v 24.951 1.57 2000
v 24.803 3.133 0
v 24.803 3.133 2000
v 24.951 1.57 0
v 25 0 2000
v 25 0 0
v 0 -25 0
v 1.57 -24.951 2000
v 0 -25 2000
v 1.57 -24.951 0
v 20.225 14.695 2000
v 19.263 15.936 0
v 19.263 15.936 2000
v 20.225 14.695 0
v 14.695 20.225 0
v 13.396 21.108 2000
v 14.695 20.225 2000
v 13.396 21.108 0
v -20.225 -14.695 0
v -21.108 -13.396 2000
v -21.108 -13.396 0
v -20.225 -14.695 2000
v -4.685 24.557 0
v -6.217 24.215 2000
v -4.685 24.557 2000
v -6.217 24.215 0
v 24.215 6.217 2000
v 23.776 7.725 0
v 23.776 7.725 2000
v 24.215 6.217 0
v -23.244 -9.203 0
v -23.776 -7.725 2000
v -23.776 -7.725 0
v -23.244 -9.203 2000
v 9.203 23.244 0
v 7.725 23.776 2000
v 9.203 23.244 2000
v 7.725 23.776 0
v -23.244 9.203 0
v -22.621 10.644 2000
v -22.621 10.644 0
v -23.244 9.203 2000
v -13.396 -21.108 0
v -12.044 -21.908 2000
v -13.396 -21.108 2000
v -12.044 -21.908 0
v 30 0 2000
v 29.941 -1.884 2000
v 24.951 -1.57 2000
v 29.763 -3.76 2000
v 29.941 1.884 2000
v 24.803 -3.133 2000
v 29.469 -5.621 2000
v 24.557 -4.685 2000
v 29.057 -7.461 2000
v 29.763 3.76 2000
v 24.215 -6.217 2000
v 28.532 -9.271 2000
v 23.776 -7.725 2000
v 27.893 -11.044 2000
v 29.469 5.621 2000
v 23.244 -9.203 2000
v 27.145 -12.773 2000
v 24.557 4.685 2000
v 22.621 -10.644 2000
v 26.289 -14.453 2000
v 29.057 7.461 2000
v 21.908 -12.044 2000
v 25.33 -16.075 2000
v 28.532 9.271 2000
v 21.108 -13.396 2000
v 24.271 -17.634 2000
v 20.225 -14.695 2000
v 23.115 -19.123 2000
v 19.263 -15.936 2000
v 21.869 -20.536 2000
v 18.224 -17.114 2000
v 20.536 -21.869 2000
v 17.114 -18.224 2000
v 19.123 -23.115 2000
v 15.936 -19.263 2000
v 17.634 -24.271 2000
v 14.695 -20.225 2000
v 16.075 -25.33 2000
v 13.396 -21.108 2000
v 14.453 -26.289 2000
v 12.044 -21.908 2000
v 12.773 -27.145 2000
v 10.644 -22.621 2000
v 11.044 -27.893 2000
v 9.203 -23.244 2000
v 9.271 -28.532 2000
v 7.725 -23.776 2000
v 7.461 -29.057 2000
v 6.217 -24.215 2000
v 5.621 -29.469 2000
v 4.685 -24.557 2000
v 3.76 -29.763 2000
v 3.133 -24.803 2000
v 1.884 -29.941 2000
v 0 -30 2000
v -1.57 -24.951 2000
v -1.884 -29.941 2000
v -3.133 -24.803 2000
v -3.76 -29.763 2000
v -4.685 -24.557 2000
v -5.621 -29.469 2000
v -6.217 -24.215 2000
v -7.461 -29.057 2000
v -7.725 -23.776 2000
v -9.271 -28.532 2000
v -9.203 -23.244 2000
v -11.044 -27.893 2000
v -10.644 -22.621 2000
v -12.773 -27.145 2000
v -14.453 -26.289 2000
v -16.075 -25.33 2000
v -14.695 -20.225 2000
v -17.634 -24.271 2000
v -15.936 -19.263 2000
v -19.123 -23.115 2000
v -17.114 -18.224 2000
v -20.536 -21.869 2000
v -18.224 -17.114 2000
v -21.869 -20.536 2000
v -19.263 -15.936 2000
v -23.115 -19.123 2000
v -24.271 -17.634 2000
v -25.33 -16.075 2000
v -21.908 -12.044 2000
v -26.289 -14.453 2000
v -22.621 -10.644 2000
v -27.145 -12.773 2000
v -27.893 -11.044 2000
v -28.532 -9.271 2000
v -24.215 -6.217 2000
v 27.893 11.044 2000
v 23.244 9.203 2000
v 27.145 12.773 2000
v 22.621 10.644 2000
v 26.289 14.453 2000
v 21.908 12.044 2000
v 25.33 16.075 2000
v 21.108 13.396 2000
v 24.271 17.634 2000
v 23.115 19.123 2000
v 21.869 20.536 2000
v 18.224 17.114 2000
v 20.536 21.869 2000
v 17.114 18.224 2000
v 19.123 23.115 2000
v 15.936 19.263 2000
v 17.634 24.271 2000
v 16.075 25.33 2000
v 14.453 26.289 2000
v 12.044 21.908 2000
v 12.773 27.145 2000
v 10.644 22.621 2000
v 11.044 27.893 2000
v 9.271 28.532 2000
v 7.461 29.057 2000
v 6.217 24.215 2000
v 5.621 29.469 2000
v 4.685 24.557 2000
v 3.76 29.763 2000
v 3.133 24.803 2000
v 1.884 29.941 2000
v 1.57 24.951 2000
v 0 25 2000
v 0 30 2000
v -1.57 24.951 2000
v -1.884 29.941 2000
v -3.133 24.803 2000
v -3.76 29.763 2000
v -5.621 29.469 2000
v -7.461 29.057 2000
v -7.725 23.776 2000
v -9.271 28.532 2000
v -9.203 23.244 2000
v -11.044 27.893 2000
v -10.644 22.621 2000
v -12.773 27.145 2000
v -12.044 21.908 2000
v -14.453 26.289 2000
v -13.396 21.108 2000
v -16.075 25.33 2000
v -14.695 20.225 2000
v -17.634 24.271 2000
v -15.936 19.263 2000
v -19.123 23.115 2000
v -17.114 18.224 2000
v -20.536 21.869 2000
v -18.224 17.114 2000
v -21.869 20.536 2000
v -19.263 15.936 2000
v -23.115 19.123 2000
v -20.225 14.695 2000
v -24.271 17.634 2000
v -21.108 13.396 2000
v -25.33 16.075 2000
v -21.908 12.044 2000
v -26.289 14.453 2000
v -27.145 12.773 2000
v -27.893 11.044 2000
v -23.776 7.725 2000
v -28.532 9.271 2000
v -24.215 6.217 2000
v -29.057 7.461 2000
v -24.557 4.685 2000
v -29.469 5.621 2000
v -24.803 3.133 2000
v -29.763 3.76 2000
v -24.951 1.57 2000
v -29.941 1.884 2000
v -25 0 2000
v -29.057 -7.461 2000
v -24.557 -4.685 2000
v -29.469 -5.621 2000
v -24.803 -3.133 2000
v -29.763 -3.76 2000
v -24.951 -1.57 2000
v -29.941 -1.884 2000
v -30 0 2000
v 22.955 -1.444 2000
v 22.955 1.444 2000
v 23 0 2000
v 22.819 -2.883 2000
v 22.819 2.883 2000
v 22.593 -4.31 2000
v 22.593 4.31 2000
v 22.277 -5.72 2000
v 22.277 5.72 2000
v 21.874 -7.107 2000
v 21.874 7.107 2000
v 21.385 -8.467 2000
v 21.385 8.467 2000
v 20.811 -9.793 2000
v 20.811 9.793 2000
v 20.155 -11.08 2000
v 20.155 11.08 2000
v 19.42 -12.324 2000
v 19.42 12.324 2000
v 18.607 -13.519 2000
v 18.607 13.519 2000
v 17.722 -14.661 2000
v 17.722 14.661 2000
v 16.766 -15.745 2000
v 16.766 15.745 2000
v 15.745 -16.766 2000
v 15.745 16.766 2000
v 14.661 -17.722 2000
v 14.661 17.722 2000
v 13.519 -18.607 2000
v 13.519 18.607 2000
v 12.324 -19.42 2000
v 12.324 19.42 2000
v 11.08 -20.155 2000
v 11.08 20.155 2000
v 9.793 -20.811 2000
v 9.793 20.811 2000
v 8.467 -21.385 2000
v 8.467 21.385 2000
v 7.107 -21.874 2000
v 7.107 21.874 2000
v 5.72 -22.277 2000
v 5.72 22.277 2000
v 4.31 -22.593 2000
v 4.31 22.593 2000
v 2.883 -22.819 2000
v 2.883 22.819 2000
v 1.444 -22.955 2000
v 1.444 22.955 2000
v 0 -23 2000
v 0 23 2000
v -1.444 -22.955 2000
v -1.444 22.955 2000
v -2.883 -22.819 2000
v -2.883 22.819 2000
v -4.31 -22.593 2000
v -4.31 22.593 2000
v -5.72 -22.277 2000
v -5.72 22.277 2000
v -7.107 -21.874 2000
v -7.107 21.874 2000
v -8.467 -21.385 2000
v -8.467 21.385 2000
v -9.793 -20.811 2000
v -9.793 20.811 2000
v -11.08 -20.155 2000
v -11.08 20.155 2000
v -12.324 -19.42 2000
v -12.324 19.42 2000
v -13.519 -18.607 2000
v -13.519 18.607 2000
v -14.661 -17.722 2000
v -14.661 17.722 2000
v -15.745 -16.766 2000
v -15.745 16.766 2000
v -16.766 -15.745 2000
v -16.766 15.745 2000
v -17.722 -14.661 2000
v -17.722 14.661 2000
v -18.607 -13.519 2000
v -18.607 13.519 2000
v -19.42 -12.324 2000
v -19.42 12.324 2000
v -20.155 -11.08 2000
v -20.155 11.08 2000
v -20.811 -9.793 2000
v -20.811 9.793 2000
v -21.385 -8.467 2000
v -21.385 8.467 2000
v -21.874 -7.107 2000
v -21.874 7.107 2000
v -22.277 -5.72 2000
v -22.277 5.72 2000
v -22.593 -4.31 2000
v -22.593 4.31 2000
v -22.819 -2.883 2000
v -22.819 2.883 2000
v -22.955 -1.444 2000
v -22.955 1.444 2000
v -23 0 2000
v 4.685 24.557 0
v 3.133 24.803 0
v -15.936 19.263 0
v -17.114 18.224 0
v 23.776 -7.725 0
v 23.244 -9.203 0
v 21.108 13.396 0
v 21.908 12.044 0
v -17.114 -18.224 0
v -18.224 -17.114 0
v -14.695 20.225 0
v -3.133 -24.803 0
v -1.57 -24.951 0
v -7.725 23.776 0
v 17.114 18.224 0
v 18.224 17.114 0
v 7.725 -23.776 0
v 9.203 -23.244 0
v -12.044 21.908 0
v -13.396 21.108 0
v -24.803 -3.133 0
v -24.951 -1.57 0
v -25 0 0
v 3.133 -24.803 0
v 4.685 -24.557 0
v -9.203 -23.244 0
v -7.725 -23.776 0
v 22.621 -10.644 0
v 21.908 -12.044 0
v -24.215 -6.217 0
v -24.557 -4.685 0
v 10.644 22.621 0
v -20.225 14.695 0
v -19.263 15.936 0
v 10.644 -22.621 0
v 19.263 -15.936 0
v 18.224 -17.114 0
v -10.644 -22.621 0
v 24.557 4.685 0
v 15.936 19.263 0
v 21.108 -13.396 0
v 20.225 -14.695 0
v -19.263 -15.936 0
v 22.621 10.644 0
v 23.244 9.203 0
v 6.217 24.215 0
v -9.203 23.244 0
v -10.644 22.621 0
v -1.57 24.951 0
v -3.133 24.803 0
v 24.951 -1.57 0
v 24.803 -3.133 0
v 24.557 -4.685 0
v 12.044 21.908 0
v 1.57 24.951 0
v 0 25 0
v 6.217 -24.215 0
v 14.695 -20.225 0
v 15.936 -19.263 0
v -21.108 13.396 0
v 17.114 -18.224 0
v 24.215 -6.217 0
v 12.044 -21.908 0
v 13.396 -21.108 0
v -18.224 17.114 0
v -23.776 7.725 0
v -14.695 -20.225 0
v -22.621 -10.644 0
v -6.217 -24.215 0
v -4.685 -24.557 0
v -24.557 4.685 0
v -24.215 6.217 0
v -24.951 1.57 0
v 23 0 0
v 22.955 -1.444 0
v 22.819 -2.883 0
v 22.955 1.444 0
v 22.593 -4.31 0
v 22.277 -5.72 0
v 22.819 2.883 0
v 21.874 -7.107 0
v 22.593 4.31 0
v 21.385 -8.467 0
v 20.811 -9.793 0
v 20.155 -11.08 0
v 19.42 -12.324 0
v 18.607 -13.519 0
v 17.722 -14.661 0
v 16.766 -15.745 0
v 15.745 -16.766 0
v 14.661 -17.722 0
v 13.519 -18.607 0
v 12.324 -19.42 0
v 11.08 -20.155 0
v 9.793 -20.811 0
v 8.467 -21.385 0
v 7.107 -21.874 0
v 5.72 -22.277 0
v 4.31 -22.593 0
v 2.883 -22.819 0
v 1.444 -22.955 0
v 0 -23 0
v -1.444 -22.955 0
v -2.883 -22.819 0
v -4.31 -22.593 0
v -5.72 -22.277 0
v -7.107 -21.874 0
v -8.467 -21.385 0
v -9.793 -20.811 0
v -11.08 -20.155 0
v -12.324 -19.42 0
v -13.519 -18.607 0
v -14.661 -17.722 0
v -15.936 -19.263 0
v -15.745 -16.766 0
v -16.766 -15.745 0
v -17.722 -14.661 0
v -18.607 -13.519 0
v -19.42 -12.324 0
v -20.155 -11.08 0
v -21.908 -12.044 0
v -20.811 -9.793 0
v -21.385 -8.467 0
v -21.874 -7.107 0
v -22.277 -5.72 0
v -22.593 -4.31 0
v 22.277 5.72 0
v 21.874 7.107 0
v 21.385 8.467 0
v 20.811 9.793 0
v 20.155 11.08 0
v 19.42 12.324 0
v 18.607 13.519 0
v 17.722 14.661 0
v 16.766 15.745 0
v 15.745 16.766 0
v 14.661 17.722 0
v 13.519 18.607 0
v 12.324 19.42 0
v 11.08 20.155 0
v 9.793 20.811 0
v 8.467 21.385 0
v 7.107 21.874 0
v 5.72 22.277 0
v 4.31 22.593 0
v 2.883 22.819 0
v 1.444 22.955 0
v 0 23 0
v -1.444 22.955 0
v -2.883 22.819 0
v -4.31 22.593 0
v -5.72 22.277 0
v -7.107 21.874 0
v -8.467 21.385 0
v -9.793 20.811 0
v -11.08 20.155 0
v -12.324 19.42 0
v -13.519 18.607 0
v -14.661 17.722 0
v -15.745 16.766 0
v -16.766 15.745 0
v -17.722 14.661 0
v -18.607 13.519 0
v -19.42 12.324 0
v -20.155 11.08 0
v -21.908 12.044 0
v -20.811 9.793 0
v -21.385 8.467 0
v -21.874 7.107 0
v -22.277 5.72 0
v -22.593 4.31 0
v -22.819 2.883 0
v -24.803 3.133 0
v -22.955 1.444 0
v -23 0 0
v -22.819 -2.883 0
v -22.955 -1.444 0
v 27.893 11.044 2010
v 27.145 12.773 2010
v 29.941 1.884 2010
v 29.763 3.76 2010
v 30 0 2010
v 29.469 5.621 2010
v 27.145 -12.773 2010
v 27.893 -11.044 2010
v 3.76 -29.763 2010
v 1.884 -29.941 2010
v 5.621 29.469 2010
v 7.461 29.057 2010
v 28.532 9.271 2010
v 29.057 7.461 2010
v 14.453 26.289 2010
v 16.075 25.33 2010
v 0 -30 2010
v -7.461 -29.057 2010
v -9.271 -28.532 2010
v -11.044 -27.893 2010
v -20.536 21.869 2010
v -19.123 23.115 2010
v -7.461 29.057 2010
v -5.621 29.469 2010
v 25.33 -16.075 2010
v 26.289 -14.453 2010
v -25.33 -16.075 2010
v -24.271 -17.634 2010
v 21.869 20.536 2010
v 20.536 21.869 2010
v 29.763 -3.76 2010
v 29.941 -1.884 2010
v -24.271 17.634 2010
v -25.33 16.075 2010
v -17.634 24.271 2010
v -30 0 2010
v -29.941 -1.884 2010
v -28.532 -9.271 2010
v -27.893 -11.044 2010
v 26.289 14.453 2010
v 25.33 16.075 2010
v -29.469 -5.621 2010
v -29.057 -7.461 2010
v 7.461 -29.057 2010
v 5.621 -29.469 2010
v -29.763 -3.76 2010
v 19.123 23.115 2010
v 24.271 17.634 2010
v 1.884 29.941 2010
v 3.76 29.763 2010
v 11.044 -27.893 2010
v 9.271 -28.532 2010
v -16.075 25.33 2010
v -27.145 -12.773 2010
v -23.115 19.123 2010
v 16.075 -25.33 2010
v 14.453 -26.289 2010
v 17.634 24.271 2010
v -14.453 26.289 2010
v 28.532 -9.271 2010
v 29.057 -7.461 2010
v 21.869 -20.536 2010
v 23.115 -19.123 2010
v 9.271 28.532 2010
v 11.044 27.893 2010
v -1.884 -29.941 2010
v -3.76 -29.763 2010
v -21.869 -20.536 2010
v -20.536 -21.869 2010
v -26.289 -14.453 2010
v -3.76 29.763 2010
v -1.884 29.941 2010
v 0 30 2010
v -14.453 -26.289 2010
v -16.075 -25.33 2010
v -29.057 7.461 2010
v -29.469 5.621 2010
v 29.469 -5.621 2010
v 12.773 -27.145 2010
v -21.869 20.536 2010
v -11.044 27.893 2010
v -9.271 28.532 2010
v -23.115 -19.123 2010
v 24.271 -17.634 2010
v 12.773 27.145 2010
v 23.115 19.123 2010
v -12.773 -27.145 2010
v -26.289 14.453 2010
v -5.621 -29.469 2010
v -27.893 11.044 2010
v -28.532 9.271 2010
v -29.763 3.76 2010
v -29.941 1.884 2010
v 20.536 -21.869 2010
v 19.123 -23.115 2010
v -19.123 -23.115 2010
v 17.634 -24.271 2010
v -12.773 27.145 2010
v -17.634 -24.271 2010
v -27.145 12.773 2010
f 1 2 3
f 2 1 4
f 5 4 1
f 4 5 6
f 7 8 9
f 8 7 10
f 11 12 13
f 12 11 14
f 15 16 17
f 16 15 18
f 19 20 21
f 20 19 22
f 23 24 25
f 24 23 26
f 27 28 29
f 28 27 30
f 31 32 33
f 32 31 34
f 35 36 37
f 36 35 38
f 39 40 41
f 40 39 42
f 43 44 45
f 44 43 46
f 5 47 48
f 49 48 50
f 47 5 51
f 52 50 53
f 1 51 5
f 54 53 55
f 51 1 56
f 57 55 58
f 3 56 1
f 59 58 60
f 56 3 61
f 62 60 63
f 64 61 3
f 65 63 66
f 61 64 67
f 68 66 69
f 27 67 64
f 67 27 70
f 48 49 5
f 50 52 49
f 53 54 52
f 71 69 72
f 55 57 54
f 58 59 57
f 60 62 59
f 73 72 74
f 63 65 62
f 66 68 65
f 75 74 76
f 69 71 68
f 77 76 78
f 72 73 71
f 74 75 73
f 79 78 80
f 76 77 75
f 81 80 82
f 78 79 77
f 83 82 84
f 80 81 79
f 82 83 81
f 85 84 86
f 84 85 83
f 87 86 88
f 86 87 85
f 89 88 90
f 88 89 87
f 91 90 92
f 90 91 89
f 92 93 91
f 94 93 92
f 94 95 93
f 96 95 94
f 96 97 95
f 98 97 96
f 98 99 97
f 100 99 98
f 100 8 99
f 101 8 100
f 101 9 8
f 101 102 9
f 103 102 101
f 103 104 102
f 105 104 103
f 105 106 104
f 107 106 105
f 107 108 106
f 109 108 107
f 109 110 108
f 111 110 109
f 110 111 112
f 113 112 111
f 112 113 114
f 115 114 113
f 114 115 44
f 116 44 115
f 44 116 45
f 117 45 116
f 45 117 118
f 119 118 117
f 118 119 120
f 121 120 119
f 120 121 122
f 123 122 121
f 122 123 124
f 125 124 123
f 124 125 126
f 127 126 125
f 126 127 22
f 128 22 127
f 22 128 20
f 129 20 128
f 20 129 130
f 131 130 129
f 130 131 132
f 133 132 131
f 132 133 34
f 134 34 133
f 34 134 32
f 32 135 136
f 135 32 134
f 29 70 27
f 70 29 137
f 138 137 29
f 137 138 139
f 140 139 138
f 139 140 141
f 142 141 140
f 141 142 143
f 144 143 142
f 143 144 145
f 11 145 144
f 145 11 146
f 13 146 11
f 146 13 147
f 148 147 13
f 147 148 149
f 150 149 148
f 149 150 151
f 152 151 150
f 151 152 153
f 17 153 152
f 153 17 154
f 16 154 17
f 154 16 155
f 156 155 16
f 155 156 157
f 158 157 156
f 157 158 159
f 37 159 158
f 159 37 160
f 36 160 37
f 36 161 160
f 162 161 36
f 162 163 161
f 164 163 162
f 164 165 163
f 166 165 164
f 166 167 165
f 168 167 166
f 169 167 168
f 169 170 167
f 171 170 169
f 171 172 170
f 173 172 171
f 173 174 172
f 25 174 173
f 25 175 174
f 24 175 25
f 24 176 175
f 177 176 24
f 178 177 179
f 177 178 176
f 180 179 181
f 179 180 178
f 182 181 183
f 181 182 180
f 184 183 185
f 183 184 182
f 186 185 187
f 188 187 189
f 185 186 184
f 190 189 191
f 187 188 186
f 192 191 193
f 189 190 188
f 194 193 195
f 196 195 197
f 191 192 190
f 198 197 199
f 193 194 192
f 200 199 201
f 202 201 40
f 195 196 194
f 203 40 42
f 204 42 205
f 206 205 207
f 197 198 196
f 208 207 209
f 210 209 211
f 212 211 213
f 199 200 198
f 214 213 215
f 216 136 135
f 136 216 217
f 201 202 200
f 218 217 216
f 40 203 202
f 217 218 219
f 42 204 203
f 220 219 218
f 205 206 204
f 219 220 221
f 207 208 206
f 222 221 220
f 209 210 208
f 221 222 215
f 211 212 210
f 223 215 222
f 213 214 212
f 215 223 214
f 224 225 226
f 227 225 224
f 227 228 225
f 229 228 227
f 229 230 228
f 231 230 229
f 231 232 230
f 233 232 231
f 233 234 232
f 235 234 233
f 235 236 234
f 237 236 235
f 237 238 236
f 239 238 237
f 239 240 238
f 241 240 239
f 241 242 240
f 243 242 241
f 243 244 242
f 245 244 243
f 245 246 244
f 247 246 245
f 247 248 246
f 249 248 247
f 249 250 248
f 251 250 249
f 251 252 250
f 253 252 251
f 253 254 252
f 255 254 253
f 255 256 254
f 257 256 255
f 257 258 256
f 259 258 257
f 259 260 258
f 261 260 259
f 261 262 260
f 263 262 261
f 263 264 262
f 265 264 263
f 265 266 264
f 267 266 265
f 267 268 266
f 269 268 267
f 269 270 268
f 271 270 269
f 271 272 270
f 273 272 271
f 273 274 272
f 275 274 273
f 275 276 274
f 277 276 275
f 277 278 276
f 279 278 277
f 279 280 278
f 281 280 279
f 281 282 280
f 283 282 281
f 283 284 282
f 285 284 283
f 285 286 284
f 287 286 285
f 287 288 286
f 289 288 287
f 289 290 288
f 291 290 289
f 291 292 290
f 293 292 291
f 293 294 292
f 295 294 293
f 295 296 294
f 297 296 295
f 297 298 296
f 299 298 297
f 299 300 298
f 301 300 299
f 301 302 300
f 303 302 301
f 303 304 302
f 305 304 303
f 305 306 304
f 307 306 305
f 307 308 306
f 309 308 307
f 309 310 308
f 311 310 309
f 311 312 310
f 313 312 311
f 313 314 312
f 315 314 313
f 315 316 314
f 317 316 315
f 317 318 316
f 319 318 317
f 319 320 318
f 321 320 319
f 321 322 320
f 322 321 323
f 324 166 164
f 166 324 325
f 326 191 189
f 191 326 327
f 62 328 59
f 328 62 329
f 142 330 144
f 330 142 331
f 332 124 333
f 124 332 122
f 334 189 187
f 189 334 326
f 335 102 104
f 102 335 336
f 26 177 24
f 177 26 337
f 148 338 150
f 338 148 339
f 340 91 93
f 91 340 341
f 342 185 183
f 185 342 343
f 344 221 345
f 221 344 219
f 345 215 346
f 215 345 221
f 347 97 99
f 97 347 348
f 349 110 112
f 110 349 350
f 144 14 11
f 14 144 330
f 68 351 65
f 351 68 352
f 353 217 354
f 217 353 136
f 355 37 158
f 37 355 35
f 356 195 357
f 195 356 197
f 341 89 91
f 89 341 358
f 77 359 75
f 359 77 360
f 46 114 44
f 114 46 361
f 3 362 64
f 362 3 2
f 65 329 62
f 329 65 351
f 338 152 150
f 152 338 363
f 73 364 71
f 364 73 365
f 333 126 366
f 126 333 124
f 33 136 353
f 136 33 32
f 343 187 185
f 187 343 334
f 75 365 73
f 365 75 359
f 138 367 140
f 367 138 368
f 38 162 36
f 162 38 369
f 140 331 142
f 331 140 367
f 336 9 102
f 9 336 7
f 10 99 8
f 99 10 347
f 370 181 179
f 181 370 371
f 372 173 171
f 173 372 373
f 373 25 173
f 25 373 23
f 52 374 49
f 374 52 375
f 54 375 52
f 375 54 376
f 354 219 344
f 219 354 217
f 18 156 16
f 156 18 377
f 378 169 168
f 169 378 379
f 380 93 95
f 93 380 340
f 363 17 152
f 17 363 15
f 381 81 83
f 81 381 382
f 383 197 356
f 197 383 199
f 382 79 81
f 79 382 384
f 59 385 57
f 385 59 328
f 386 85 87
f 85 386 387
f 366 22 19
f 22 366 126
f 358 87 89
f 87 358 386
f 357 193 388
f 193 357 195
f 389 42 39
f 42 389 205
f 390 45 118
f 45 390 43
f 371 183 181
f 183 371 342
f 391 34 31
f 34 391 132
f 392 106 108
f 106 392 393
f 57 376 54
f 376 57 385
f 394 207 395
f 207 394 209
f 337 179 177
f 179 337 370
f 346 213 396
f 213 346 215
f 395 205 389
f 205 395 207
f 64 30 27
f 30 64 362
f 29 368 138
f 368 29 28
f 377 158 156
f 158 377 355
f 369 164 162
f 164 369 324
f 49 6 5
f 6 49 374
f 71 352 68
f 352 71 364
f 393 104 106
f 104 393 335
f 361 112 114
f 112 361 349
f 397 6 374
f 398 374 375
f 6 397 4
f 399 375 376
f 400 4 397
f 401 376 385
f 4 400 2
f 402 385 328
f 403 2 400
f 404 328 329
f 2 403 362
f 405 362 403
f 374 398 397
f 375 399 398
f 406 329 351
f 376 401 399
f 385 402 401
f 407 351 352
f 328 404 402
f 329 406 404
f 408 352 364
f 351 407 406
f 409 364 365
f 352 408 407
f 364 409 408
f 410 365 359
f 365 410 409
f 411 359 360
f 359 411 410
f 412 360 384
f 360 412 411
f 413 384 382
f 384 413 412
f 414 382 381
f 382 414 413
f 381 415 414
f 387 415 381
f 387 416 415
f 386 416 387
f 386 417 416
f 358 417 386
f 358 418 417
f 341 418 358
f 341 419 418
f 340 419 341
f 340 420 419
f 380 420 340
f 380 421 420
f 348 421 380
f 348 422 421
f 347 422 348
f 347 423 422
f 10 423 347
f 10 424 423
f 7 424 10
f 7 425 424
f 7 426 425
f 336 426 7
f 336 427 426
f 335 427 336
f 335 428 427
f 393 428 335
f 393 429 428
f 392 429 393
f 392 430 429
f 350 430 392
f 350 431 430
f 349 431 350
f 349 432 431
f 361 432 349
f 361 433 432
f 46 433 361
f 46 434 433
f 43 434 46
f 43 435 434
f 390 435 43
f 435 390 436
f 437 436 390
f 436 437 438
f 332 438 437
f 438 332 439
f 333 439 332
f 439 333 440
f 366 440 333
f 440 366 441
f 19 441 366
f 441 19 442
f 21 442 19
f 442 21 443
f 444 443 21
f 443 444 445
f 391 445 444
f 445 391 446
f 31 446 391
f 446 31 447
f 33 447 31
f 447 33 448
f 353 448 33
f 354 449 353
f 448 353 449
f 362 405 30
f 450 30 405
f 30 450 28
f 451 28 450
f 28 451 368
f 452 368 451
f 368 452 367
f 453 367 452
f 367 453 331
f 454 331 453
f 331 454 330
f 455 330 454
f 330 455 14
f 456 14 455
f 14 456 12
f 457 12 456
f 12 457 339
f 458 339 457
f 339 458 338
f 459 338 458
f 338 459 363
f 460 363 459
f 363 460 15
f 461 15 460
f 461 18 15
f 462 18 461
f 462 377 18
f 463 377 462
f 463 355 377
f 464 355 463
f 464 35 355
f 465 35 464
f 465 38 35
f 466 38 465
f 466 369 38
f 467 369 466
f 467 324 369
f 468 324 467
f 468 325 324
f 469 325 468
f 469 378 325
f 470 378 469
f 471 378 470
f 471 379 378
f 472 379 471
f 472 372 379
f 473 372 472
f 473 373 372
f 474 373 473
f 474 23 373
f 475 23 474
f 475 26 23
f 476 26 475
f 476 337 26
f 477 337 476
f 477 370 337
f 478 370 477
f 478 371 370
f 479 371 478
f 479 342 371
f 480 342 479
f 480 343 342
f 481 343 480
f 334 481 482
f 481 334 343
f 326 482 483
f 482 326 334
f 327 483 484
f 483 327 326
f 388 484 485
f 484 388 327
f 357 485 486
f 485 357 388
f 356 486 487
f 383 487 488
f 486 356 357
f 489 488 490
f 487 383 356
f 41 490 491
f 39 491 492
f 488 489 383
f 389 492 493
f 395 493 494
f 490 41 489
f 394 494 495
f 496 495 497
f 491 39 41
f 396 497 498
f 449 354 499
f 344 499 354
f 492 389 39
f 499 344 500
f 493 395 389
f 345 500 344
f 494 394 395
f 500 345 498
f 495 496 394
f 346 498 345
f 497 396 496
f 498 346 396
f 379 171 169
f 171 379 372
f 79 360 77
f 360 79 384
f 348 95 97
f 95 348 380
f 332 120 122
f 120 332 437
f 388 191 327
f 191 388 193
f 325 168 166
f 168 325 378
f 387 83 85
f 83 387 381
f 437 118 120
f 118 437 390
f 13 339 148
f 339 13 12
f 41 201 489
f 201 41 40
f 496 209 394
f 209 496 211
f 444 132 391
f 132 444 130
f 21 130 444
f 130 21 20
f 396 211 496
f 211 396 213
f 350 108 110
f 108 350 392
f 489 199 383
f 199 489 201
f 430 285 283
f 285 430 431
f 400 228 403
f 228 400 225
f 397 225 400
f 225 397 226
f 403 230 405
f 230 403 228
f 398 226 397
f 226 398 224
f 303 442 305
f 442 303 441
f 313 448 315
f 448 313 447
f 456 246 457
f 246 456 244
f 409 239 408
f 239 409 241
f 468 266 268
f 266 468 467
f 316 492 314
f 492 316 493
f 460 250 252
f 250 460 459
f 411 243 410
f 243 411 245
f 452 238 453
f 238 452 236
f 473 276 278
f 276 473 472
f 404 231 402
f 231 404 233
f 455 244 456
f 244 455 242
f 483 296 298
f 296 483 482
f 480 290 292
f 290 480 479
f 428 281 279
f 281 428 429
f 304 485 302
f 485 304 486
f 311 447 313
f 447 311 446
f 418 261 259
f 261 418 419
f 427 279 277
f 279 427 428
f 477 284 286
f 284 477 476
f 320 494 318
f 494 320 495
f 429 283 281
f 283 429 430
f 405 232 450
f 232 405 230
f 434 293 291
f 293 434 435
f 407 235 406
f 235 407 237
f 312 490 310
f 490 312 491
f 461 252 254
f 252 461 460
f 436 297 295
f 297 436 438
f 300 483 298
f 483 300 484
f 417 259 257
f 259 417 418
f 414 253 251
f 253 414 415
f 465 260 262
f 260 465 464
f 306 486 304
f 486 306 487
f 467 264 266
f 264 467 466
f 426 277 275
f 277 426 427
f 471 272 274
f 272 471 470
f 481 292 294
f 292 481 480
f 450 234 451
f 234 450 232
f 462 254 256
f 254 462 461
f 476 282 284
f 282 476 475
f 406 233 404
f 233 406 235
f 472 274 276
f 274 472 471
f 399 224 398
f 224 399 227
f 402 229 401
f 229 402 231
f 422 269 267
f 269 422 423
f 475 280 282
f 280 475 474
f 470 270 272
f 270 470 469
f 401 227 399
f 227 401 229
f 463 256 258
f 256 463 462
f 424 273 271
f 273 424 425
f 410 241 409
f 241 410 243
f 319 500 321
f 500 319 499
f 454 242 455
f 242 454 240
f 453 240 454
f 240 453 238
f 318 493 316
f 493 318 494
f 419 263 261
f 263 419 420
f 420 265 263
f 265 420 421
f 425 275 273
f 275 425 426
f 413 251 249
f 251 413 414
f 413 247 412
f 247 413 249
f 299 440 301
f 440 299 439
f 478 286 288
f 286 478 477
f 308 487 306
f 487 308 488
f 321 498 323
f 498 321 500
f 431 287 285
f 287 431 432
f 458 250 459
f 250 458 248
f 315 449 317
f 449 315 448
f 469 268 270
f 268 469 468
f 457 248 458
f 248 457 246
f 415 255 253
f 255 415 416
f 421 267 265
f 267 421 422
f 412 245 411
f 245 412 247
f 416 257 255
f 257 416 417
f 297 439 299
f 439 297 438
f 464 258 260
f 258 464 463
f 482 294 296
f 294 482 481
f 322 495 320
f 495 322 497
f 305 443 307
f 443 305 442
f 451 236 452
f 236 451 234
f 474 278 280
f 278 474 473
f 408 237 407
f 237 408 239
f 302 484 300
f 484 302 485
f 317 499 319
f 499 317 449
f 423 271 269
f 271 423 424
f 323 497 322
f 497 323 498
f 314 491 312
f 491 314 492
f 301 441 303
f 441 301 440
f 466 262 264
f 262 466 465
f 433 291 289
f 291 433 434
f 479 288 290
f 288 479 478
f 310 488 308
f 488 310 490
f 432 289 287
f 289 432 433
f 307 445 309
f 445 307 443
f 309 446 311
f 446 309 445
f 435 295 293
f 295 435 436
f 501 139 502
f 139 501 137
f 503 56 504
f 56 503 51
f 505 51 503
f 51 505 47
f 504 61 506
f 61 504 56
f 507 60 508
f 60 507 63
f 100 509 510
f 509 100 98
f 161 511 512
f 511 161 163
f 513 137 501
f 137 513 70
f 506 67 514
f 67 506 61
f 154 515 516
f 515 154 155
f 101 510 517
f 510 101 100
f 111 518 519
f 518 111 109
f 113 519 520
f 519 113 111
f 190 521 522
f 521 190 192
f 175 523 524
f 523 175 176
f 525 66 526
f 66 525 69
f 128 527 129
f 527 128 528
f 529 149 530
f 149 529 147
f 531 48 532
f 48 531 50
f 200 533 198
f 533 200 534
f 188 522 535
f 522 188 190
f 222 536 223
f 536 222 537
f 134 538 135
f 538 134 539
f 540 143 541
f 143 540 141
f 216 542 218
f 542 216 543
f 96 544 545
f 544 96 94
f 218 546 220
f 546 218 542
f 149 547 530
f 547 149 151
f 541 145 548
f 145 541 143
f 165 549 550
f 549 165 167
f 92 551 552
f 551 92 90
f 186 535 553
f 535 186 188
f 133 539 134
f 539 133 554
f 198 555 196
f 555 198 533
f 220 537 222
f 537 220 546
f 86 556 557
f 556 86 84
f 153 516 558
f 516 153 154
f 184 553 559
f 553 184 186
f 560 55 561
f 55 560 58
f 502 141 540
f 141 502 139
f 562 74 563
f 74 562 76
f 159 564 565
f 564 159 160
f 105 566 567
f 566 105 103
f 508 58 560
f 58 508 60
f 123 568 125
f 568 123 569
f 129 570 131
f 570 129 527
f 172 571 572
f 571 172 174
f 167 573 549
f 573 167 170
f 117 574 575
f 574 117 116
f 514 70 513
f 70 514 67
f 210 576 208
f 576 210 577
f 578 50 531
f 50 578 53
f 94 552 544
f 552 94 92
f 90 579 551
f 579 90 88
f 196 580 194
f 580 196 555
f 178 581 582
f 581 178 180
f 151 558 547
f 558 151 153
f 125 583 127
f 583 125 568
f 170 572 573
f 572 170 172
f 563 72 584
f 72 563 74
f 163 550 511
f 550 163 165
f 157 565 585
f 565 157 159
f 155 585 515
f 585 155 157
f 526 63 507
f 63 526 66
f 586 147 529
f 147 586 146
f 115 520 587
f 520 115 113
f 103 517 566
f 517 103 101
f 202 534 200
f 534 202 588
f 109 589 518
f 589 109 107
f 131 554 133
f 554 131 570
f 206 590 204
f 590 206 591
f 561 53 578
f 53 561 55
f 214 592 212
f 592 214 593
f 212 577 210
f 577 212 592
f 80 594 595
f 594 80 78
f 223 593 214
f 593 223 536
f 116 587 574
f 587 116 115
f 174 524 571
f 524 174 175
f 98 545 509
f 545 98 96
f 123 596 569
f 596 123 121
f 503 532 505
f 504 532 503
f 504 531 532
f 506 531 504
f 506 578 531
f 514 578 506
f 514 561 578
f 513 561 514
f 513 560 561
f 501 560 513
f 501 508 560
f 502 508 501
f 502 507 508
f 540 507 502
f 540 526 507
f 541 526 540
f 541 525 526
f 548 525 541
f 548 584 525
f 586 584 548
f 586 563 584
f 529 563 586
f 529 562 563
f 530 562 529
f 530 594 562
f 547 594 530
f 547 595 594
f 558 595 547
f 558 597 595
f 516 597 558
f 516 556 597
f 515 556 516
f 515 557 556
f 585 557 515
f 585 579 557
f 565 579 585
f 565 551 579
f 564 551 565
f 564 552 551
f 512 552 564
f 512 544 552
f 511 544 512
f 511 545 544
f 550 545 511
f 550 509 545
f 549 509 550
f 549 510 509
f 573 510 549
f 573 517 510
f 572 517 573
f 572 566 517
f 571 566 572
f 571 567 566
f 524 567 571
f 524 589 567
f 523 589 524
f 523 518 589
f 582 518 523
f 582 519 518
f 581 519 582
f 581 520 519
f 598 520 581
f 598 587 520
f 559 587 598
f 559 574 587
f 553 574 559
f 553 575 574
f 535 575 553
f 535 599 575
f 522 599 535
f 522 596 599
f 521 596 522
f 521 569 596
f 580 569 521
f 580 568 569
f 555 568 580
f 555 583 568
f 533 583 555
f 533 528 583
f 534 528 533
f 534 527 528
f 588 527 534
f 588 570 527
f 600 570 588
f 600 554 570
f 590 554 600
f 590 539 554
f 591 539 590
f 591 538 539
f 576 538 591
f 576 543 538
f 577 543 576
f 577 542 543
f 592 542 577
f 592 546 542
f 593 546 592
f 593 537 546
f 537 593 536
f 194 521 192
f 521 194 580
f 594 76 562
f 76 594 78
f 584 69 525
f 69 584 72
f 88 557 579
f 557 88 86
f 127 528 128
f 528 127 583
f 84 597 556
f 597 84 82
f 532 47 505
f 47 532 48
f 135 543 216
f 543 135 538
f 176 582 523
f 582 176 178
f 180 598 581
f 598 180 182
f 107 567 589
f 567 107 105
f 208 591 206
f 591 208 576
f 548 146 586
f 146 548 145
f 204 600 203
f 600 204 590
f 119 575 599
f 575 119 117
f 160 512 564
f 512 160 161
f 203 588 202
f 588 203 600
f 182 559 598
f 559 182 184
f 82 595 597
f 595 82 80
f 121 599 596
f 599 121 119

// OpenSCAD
// Parameters for HT 50 pipe
pipe_diameter = 50; // Outer diameter in mm
pipe_thickness = 2; // Wall thickness in mm
pipe_length = 2000; // Length in mm

// Function to create the main body of the HT pipe
module ht_pipe_body() {
    difference() {
        cylinder(h = pipe_length, d = pipe_diameter, $fn=100);
        translate([0, 0, -1])
            cylinder(h = pipe_length + 2, d = pipe_diameter - 2 * pipe_thickness, $fn=100);
    }
}

// Function to create the end fitting geometry
module end_fitting_geometry() {
    translate([0, 0, pipe_length])
        cylinder(h = 10, d = pipe_diameter + 10, $fn=100);
}

// Main module to assemble the HT pipe
module ht_pipe() {
    ht_pipe_body();
    end_fitting_geometry();
}

// Render the HT pipe
ht_pipe();
